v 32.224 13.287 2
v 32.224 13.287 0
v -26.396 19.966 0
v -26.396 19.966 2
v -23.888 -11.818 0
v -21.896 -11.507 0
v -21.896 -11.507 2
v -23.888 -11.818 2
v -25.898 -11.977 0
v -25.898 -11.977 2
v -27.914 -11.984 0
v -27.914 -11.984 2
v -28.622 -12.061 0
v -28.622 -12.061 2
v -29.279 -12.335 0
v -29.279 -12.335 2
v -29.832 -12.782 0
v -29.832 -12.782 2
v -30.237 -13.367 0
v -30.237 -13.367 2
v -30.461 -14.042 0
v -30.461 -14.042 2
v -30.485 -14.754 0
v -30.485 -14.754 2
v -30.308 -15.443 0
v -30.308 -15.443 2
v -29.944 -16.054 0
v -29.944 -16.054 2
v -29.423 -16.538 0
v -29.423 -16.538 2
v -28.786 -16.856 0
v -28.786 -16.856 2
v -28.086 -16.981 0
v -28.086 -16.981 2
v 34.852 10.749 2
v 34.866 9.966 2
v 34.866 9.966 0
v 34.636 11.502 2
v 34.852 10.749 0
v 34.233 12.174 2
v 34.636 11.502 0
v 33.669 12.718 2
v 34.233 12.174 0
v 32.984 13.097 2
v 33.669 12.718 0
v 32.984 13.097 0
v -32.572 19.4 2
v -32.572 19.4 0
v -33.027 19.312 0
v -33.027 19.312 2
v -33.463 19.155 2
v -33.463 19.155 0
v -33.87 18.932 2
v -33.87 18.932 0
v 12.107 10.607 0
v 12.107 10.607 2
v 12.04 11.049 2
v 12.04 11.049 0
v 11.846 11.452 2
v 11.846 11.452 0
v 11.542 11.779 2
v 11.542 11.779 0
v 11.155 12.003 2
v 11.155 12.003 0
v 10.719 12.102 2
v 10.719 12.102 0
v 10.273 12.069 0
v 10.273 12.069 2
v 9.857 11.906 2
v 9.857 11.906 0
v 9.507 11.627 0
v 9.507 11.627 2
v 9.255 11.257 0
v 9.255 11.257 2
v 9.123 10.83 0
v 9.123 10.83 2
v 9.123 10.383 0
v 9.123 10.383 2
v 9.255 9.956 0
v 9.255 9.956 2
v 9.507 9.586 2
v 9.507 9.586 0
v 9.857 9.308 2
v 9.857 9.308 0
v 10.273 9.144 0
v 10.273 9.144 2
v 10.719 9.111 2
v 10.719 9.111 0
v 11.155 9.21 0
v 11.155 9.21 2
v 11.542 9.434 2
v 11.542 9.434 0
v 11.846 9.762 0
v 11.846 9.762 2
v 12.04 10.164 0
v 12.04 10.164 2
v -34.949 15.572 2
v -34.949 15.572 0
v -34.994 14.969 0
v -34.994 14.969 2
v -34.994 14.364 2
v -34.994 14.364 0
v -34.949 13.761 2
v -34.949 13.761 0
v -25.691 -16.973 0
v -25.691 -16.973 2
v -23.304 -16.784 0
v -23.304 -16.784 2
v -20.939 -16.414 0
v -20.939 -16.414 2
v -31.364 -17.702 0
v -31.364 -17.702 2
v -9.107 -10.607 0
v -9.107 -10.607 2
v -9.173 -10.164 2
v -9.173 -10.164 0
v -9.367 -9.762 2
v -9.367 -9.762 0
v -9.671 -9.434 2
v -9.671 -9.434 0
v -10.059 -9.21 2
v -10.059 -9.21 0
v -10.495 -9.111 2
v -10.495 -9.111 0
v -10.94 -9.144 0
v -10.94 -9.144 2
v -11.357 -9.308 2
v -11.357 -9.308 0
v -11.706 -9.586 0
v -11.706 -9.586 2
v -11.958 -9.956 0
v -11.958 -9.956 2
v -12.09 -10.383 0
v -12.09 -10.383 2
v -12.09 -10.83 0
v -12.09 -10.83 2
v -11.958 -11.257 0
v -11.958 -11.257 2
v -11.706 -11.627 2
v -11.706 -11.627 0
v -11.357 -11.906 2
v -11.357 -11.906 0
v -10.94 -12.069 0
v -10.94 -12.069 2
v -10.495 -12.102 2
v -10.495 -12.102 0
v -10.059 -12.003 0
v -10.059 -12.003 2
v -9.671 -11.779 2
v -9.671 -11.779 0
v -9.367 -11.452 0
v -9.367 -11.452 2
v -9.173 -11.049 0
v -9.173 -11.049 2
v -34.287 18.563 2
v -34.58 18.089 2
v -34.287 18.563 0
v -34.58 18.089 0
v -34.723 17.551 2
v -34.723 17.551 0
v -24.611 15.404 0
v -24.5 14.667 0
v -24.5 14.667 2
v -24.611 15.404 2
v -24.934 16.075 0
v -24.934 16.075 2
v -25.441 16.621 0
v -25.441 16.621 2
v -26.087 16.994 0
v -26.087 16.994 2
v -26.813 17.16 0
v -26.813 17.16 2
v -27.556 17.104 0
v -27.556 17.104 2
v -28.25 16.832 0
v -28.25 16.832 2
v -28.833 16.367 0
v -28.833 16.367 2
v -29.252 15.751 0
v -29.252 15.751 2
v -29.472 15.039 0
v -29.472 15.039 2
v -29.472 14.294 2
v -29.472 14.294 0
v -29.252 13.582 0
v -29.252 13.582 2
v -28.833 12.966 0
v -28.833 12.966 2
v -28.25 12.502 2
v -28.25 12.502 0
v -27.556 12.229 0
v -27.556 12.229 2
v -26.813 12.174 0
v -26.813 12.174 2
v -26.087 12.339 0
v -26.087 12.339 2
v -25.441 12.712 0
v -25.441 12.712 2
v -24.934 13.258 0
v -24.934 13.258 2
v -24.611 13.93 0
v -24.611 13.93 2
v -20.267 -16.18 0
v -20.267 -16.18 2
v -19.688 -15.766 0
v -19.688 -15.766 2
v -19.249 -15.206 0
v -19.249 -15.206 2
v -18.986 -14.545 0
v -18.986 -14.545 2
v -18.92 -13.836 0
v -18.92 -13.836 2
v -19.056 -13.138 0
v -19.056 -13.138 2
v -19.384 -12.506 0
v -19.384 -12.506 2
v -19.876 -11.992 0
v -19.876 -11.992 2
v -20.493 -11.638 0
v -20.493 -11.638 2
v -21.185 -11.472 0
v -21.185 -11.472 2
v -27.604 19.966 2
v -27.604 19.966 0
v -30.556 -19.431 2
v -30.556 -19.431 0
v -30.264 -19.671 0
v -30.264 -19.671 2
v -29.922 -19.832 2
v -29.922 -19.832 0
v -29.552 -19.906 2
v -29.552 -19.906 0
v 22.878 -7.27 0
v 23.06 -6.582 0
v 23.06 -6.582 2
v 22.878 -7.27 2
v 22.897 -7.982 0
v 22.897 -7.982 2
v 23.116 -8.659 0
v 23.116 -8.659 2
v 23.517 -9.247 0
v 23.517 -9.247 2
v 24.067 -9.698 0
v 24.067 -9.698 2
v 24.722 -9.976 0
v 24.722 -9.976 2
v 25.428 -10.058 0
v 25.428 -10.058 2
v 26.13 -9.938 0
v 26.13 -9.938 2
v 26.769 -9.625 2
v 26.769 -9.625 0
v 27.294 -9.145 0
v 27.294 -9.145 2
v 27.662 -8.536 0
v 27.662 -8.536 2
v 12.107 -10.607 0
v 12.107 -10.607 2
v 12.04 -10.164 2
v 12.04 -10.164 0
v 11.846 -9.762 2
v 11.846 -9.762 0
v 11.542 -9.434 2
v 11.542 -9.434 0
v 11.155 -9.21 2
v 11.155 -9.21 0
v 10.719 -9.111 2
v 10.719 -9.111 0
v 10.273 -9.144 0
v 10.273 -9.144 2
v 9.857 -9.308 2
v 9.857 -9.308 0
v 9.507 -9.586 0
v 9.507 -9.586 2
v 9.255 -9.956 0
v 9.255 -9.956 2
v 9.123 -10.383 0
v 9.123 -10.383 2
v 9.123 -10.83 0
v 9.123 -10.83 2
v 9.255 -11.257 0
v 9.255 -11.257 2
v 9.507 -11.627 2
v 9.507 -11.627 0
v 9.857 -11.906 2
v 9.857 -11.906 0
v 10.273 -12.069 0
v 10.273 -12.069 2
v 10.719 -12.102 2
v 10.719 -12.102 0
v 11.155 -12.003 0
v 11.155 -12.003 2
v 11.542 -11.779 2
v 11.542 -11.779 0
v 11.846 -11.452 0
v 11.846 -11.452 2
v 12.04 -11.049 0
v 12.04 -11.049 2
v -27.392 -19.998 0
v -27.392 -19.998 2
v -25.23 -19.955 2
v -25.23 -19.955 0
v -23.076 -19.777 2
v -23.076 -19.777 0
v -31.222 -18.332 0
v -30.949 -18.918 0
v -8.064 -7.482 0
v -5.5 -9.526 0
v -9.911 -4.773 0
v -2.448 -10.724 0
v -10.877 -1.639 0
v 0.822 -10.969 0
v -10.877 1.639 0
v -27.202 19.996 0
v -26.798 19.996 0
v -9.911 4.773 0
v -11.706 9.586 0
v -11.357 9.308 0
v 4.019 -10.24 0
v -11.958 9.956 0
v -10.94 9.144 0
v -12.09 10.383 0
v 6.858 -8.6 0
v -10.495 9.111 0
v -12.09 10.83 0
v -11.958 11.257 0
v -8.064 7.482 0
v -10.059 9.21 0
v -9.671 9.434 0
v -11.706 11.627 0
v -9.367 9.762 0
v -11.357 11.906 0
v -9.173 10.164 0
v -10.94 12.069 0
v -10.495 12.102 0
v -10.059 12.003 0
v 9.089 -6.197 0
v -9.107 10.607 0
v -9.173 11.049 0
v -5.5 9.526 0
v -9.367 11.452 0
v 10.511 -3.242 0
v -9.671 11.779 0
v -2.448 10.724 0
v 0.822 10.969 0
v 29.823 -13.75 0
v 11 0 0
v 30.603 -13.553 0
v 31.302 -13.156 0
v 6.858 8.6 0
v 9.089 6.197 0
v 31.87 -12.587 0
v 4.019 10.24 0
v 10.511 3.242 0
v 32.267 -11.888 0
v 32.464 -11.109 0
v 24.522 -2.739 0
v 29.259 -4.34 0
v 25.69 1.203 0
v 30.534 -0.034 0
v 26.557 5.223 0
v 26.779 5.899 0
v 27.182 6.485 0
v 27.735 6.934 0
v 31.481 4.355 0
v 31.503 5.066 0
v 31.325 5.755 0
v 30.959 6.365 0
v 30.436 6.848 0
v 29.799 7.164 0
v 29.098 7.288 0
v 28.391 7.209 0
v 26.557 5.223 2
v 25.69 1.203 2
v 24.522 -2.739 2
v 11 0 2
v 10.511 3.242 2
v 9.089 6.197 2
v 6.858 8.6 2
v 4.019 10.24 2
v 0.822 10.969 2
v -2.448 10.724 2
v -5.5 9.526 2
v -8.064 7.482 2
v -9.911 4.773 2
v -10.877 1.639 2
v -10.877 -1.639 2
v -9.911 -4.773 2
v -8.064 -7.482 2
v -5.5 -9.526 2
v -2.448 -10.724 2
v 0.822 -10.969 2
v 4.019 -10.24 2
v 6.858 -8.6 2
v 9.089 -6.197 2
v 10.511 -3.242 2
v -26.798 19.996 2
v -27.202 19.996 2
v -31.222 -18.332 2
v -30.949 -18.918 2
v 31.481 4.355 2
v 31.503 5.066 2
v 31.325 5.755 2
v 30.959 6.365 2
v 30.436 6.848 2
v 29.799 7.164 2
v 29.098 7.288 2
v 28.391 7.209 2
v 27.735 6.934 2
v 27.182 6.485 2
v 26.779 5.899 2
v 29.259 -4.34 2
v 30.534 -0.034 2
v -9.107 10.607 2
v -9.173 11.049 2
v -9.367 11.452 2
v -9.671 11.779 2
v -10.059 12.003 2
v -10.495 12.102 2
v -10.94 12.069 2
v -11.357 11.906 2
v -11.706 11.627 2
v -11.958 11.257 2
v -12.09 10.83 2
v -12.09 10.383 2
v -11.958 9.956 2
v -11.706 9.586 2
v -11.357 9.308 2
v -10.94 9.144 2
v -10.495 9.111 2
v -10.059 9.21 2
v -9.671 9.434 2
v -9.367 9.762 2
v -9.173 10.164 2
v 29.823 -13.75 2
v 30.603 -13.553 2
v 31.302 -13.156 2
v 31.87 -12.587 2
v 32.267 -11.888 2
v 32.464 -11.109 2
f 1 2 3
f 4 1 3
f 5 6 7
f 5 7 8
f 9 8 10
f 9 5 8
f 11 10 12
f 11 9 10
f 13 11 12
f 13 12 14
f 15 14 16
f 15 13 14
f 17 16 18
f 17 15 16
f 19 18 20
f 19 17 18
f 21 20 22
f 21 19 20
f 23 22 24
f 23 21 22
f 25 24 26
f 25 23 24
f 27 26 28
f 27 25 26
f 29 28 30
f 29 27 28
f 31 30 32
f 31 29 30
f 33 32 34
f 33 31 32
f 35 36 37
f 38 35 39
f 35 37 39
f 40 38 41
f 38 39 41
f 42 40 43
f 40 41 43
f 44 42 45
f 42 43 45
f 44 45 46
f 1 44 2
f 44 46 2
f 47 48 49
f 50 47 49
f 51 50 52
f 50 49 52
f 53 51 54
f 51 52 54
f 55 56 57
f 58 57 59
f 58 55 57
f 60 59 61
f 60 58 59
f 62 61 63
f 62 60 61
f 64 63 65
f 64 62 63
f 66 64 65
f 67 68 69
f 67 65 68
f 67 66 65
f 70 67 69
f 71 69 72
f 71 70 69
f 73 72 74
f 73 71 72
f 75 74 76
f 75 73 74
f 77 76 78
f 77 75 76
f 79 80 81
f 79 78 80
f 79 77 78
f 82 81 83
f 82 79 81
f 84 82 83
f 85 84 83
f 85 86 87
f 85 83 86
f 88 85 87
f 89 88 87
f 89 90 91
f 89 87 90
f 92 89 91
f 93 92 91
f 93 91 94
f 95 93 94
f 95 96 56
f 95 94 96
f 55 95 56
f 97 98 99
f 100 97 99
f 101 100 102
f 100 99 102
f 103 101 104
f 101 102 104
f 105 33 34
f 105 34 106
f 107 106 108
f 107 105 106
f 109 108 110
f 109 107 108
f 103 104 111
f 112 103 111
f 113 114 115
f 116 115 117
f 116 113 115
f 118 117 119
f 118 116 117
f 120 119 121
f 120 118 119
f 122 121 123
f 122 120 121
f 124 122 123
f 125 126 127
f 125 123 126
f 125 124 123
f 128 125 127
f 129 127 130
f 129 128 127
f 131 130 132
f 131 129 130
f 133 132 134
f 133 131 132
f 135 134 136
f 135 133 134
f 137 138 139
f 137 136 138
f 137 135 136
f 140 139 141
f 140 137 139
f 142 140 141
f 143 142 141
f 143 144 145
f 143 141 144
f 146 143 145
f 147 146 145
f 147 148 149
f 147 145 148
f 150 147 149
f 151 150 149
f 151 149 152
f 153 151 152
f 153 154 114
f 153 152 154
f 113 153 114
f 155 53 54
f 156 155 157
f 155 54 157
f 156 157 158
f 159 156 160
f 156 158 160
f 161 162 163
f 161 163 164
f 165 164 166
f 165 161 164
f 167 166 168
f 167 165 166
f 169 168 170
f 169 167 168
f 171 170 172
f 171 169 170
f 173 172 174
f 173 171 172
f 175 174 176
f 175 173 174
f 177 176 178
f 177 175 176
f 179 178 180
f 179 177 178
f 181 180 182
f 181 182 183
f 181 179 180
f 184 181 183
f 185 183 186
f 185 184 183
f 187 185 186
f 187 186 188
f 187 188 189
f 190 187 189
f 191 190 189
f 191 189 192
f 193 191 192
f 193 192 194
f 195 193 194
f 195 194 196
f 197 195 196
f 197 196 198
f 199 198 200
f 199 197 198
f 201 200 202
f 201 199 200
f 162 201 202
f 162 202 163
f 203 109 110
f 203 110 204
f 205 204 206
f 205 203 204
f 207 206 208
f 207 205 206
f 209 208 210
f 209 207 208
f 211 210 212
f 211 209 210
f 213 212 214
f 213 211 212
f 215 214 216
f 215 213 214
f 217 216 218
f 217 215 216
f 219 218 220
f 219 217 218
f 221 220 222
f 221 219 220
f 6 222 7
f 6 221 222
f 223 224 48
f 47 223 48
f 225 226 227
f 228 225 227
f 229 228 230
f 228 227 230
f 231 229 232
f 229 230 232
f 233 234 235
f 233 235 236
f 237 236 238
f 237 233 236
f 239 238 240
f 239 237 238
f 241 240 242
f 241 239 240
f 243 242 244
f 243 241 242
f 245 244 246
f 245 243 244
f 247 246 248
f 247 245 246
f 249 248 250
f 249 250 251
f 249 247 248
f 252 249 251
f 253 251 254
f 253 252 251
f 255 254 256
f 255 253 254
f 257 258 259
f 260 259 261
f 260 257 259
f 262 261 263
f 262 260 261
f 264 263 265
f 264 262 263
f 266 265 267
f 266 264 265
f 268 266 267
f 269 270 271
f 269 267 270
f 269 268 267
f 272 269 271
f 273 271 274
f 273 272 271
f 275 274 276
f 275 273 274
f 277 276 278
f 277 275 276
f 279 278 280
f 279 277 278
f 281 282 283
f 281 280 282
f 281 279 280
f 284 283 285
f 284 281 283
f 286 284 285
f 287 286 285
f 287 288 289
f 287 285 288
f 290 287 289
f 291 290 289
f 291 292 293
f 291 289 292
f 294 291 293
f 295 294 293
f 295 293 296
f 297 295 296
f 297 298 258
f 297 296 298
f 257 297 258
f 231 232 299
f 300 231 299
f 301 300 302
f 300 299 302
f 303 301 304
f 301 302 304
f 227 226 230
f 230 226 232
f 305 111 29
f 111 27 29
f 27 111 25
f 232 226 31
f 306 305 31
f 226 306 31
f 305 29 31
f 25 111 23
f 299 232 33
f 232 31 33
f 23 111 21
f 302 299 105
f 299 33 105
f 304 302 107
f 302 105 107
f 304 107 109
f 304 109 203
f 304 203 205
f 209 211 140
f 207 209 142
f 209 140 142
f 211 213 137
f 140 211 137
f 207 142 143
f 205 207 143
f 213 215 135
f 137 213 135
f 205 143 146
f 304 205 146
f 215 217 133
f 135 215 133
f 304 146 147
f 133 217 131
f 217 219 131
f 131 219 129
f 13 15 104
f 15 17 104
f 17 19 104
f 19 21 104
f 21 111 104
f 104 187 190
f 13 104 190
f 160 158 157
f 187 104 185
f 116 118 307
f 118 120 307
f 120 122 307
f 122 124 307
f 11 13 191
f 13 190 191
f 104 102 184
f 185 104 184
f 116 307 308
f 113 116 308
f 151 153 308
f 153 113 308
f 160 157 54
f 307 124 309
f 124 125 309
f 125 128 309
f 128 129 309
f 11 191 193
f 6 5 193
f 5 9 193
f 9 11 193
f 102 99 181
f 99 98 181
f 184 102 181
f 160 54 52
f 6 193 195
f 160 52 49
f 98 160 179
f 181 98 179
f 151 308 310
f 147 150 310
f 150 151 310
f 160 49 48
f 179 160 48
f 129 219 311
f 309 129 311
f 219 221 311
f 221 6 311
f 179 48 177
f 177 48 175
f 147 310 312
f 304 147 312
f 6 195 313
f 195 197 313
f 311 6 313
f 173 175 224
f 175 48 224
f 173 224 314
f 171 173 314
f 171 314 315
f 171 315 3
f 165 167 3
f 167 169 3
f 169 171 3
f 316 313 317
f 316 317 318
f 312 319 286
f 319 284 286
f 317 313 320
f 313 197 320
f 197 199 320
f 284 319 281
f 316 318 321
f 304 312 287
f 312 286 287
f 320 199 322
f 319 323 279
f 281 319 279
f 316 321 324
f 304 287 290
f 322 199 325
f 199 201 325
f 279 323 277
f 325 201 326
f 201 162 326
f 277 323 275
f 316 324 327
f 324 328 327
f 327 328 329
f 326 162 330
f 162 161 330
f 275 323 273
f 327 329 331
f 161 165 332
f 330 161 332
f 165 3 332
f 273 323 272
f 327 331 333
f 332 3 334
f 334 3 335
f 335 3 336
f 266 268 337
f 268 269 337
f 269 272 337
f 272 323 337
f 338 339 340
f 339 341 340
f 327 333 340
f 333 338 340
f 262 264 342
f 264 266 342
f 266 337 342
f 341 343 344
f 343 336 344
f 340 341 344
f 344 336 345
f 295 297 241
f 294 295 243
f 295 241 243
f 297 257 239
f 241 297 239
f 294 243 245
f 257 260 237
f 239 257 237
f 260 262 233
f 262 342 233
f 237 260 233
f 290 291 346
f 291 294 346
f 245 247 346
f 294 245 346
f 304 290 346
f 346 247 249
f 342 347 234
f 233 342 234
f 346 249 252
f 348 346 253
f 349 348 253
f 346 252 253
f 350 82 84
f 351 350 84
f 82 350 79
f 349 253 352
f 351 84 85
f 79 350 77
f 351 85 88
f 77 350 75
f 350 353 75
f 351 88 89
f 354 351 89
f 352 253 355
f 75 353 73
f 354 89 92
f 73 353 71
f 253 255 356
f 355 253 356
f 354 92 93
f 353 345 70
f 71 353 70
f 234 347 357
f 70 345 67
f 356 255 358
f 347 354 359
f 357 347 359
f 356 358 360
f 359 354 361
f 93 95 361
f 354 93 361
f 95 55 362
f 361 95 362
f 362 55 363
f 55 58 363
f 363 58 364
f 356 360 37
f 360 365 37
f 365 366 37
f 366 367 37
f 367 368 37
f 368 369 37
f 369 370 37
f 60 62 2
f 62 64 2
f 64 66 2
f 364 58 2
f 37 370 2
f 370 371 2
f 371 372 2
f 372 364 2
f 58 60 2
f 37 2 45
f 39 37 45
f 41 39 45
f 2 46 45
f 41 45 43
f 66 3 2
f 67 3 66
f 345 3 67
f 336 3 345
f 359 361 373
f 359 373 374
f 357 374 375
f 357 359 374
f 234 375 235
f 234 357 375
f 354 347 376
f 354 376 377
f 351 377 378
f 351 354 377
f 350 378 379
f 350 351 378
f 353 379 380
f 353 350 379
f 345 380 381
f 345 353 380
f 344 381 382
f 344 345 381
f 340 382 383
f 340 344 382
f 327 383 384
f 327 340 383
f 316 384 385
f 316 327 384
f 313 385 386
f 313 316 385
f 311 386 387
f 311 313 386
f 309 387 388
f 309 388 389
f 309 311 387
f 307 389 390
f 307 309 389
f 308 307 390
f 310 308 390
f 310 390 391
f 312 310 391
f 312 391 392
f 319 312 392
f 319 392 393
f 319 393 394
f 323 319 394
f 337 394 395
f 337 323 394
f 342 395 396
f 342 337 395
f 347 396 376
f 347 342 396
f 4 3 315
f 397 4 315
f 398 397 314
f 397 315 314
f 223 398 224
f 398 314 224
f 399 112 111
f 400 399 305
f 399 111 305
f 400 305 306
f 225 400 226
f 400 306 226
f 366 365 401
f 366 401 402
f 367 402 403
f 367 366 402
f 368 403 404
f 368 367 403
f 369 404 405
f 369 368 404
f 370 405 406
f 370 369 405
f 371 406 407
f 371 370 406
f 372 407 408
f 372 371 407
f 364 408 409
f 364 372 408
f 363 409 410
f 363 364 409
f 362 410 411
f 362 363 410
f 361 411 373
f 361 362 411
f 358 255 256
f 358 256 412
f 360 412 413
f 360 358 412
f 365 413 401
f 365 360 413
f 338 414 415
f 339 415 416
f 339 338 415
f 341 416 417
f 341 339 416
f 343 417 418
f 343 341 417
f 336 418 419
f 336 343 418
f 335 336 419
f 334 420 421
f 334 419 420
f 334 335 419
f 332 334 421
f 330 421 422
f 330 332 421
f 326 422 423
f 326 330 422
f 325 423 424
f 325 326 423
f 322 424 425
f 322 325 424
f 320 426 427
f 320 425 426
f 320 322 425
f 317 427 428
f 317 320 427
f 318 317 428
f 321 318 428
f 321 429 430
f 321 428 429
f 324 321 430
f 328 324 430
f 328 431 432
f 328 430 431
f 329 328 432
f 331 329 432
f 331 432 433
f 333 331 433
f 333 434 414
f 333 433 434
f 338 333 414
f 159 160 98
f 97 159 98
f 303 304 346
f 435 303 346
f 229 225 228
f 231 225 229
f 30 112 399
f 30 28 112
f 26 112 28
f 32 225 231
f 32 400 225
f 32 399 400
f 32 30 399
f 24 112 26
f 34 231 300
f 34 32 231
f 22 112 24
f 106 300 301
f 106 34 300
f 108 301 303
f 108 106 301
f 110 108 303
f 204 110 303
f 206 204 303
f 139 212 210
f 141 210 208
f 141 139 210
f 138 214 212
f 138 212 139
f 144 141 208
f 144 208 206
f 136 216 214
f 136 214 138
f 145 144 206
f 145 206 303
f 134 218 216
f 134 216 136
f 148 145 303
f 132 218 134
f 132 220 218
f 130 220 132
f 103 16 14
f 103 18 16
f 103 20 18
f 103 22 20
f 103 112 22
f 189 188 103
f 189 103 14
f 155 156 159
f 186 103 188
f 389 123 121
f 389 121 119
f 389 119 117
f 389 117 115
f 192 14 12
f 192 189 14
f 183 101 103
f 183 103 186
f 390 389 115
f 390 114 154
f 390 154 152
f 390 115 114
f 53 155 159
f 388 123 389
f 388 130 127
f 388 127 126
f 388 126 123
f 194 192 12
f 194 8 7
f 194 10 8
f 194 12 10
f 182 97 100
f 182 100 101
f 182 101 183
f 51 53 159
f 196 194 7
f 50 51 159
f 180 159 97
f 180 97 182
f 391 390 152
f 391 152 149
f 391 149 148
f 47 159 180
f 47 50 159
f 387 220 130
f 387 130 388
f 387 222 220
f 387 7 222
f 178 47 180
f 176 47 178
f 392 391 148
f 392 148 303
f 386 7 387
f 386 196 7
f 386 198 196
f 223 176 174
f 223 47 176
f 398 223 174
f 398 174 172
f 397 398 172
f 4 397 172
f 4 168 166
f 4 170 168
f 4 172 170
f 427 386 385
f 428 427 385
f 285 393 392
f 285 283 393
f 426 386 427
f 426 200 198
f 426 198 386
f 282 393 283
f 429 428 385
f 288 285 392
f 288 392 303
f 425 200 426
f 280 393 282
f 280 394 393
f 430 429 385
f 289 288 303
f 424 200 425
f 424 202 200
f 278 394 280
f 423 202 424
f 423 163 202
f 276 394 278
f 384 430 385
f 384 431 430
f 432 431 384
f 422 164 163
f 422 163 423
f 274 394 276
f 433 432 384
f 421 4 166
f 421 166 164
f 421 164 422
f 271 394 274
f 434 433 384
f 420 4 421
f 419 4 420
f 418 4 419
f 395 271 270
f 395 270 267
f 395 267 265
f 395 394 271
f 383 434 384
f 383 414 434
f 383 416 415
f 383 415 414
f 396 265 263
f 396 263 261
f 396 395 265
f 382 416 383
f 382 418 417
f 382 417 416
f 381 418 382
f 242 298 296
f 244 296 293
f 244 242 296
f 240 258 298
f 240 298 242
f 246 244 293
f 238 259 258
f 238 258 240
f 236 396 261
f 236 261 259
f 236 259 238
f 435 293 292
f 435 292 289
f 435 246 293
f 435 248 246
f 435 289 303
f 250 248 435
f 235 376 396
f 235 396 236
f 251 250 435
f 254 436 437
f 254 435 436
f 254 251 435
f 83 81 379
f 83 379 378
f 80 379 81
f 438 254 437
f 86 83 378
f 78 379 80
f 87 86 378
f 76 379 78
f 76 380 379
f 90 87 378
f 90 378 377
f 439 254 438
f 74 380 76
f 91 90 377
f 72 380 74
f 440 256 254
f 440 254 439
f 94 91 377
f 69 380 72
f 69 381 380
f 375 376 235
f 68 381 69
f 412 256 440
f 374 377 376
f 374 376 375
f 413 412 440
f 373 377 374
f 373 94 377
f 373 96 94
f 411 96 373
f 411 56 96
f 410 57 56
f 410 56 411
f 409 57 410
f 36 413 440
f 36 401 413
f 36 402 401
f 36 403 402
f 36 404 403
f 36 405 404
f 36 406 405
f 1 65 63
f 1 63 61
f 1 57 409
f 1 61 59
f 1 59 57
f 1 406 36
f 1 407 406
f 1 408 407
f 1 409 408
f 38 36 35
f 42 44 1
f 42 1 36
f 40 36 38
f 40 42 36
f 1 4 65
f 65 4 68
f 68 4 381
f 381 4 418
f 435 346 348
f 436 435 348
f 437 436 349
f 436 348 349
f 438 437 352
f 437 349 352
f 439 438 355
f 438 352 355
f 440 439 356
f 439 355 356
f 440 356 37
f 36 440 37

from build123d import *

# Parameters (mm, degrees)
SZKIC1_R                    = 11
SZKIC1_R_2                  = 2.5
DODANIE_WYCI_GNI_CIE1_DEPTH = 2
SZKIC2_R                    = 1.5
WYTNIJ_WYCI_GNI_CIE2_DEPTH  = 3
SZKIC3_OUTSIDE_W            = 88.13
SZKIC3_OUTSIDE_H            = 58.13
WYTNIJ_WYCI_GNI_CIE3_DEPTH  = 3


with BuildPart() as part:
    # Szkic1 → Dodanie-wyciągnięcie1 (new body)
    with BuildSketch(Plane.XY):
        with BuildLine():
            Line((-32, -20), (32, -20))
            ThreePointArc((32, -20), (34.121320344, -19.121320344), (35, -17))
            Line((35, -17), (35, 17))
            ThreePointArc((35, 17), (34.121320344, 19.121320344), (32, 20))
            Line((32, 20), (-32, 20))
            ThreePointArc((-32, 20), (-34.121320344, 19.121320344), (-35, 17))
            Line((-35, 17), (-35, -17))
            ThreePointArc((-35, -17), (-34.121320344, -19.121320344), (-32, -20))
        make_face()
        Circle(SZKIC1_R, mode=Mode.SUBTRACT)
        with Locations((-27, 14.666666667)):
            Circle(SZKIC1_R_2, mode=Mode.SUBTRACT)
        with BuildLine():
            ThreePointArc((27.662313373, -8.536108756), (29.93756488, -2.199008421), (31.480810618, 4.354921901))
            ThreePointArc((31.480810618, 4.354921901), (29.452911679, 7.251061728), (26.556771853, 5.223162789))
            ThreePointArc((26.556771853, 5.223162789), (25.143466206, -0.778931698), (23.059789106, -6.582453114))
            ThreePointArc((23.059789106, -6.582453114), (24.384223418, -9.860543068), (27.662313373, -8.536108756))
        make_face(mode=Mode.SUBTRACT)
        with BuildLine():
            ThreePointArc((-28.085714286, -16.981382282), (-24.496074307, -16.900850402), (-20.93862552, -16.414477411))
            ThreePointArc((-20.93862552, -16.414477411), (-18.963380552, -13.482173315), (-21.895684648, -11.506928346))
            ThreePointArc((-21.895684648, -11.506928346), (-24.891430995, -11.916505602), (-27.914285714, -11.984321922))
            ThreePointArc((-27.914285714, -11.984321922), (-30.49853018, -14.397137816), (-28.085714286, -16.981382282))
        make_face(mode=Mode.SUBTRACT)
    extrude(amount=DODANIE_WYCI_GNI_CIE1_DEPTH)

    # Szkic2 → Wytnij-wyciągnięcie2 (cut, through all)
    with BuildSketch(Plane.XY):
        with Locations((-10.606601718, 10.606601718)):
            Circle(SZKIC2_R)
        with Locations((10.606601718, 10.606601718)):
            Circle(SZKIC2_R)
        with Locations((10.606601718, -10.606601718)):
            Circle(SZKIC2_R)
        with Locations((-10.606601718, -10.606601718)):
            Circle(SZKIC2_R)
    extrude(amount=WYTNIJ_WYCI_GNI_CIE2_DEPTH, mode=Mode.SUBTRACT)

    # Szkic3 outside → Wytnij-wyciągnięcie3 (cut, through all)
    with BuildSketch(Plane.XY):
        Rectangle(SZKIC3_OUTSIDE_W, SZKIC3_OUTSIDE_H)
        with BuildLine():
            Line((32.464358731, -11.108986267), (34.865595884, 9.966401743))
            ThreePointArc((34.865595884, 9.966401743), (34.232704788, 12.173555294), (32.224489958, 13.286726951))
            Line((32.224489958, 13.286726951), (-26.396249527, 19.965716564))
            ThreePointArc((-26.396249527, 19.965716564), (-27, 20), (-27.603750473, 19.965716564))
            Line((-27.603750473, 19.965716564), (-32.571609752, 19.399700495))
            ThreePointArc((-32.571609752, 19.399700495), (-33.247974324, 19.241713465), (-33.869879413, 18.932419111))
            ThreePointArc((-33.869879413, 18.932419111), (-34.450895793, 18.337181113), (-34.723108417, 17.551185823))
            Line((-34.723108417, 17.551185823), (-34.948574845, 15.572292377))
            ThreePointArc((-34.948574845, 15.572292377), (-35, 14.666666667), (-34.948574845, 13.761040957))
            Line((-34.948574845, 13.761040957), (-31.363806409, -17.702067807))
            ThreePointArc((-31.363806409, -17.702067807), (-31.101077058, -18.632320729), (-30.556161181, -19.430734091))
            ThreePointArc((-30.556161181, -19.430734091), (-30.098141008, -19.761880936), (-29.551624806, -19.905966855))
            ThreePointArc((-29.551624806, -19.905966855), (-26.310608357, -19.993144599), (-23.075621923, -19.777157663))
            Line((-23.075621923, -19.777157663), (29.823252805, -13.750092193))
            ThreePointArc((29.823252805, -13.750092193), (31.604963507, -12.890696969), (32.464358731, -11.108986267))
        make_face(mode=Mode.SUBTRACT)
    extrude(amount=WYTNIJ_WYCI_GNI_CIE3_DEPTH, mode=Mode.SUBTRACT)


solid = part.part
